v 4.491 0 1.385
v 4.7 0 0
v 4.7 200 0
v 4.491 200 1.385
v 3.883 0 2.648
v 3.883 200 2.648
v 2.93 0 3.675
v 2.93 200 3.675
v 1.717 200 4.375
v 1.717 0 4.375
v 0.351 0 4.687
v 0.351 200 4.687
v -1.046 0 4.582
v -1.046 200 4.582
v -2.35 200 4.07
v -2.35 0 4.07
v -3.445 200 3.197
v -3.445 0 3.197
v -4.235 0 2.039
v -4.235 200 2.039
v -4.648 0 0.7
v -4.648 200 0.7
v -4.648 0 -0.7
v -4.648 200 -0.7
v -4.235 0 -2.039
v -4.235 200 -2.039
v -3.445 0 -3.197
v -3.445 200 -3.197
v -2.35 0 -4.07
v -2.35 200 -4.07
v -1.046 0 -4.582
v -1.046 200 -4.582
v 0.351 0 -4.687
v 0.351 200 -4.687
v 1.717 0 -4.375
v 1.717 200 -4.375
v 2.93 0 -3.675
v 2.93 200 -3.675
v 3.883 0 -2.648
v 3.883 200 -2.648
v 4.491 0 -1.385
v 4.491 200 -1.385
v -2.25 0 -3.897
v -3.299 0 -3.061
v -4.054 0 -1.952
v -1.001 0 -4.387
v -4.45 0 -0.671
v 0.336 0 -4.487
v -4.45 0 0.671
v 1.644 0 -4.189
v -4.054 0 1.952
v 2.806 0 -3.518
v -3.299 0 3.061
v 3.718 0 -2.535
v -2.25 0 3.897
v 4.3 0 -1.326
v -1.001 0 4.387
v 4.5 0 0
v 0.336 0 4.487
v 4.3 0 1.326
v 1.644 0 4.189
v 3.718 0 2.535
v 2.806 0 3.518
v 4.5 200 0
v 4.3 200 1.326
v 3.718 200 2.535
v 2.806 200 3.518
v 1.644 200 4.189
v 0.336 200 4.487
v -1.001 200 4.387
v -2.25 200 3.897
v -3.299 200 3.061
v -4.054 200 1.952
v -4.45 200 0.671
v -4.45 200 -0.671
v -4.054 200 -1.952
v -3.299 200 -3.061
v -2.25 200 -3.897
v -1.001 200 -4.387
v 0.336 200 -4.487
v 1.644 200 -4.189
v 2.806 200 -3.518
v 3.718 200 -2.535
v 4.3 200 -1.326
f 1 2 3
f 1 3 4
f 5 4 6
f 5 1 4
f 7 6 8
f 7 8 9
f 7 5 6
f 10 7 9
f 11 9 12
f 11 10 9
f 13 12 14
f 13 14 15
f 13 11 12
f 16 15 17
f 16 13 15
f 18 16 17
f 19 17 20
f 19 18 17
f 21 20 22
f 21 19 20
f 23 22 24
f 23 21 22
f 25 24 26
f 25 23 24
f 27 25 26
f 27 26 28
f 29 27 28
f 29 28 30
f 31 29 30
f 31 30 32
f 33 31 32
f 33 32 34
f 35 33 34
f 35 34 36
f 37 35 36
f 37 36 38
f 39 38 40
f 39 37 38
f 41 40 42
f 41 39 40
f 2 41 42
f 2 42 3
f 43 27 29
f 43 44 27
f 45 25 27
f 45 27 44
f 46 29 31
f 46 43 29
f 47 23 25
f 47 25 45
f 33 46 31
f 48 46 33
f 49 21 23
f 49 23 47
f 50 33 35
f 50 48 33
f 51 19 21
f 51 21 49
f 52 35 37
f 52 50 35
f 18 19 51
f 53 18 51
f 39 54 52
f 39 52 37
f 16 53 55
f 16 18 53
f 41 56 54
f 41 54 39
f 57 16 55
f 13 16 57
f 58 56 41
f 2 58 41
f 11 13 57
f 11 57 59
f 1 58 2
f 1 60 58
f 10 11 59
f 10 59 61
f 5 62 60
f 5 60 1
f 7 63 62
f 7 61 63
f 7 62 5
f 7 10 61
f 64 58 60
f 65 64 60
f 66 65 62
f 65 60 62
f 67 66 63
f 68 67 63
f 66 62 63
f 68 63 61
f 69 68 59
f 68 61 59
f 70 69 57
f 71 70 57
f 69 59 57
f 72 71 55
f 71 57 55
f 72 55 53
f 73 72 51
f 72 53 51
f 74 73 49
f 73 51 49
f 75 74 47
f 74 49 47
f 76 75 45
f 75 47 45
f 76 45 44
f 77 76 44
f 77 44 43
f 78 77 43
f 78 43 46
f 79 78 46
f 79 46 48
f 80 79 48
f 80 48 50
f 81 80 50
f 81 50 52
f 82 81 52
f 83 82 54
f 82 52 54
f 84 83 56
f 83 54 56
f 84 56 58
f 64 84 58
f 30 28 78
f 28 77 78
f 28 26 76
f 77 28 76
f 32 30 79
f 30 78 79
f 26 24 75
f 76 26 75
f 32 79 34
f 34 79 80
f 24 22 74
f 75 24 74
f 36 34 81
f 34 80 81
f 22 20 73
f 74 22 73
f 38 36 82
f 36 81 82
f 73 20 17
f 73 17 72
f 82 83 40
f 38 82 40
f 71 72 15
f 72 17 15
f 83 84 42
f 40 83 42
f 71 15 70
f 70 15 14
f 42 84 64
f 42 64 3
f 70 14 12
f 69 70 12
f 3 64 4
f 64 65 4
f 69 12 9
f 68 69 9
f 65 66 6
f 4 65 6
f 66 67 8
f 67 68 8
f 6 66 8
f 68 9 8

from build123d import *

# Parameters (mm, degrees)
F0_R     = 4.7
F0_R_2   = 4.5
F1_DEPTH = 200


with BuildPart() as f1:
    # F0 (on Front) → F1 (new body)
    with BuildSketch(Plane.XZ):
        Circle(F0_R)
        Circle(F0_R_2, mode=Mode.SUBTRACT)
    extrude(amount=-F1_DEPTH)


with BuildPart() as f3_1:
    # F3: instance of F1
    add(f1.part.mirror(Plane.YZ.offset(-15)))


solid = f1.part
